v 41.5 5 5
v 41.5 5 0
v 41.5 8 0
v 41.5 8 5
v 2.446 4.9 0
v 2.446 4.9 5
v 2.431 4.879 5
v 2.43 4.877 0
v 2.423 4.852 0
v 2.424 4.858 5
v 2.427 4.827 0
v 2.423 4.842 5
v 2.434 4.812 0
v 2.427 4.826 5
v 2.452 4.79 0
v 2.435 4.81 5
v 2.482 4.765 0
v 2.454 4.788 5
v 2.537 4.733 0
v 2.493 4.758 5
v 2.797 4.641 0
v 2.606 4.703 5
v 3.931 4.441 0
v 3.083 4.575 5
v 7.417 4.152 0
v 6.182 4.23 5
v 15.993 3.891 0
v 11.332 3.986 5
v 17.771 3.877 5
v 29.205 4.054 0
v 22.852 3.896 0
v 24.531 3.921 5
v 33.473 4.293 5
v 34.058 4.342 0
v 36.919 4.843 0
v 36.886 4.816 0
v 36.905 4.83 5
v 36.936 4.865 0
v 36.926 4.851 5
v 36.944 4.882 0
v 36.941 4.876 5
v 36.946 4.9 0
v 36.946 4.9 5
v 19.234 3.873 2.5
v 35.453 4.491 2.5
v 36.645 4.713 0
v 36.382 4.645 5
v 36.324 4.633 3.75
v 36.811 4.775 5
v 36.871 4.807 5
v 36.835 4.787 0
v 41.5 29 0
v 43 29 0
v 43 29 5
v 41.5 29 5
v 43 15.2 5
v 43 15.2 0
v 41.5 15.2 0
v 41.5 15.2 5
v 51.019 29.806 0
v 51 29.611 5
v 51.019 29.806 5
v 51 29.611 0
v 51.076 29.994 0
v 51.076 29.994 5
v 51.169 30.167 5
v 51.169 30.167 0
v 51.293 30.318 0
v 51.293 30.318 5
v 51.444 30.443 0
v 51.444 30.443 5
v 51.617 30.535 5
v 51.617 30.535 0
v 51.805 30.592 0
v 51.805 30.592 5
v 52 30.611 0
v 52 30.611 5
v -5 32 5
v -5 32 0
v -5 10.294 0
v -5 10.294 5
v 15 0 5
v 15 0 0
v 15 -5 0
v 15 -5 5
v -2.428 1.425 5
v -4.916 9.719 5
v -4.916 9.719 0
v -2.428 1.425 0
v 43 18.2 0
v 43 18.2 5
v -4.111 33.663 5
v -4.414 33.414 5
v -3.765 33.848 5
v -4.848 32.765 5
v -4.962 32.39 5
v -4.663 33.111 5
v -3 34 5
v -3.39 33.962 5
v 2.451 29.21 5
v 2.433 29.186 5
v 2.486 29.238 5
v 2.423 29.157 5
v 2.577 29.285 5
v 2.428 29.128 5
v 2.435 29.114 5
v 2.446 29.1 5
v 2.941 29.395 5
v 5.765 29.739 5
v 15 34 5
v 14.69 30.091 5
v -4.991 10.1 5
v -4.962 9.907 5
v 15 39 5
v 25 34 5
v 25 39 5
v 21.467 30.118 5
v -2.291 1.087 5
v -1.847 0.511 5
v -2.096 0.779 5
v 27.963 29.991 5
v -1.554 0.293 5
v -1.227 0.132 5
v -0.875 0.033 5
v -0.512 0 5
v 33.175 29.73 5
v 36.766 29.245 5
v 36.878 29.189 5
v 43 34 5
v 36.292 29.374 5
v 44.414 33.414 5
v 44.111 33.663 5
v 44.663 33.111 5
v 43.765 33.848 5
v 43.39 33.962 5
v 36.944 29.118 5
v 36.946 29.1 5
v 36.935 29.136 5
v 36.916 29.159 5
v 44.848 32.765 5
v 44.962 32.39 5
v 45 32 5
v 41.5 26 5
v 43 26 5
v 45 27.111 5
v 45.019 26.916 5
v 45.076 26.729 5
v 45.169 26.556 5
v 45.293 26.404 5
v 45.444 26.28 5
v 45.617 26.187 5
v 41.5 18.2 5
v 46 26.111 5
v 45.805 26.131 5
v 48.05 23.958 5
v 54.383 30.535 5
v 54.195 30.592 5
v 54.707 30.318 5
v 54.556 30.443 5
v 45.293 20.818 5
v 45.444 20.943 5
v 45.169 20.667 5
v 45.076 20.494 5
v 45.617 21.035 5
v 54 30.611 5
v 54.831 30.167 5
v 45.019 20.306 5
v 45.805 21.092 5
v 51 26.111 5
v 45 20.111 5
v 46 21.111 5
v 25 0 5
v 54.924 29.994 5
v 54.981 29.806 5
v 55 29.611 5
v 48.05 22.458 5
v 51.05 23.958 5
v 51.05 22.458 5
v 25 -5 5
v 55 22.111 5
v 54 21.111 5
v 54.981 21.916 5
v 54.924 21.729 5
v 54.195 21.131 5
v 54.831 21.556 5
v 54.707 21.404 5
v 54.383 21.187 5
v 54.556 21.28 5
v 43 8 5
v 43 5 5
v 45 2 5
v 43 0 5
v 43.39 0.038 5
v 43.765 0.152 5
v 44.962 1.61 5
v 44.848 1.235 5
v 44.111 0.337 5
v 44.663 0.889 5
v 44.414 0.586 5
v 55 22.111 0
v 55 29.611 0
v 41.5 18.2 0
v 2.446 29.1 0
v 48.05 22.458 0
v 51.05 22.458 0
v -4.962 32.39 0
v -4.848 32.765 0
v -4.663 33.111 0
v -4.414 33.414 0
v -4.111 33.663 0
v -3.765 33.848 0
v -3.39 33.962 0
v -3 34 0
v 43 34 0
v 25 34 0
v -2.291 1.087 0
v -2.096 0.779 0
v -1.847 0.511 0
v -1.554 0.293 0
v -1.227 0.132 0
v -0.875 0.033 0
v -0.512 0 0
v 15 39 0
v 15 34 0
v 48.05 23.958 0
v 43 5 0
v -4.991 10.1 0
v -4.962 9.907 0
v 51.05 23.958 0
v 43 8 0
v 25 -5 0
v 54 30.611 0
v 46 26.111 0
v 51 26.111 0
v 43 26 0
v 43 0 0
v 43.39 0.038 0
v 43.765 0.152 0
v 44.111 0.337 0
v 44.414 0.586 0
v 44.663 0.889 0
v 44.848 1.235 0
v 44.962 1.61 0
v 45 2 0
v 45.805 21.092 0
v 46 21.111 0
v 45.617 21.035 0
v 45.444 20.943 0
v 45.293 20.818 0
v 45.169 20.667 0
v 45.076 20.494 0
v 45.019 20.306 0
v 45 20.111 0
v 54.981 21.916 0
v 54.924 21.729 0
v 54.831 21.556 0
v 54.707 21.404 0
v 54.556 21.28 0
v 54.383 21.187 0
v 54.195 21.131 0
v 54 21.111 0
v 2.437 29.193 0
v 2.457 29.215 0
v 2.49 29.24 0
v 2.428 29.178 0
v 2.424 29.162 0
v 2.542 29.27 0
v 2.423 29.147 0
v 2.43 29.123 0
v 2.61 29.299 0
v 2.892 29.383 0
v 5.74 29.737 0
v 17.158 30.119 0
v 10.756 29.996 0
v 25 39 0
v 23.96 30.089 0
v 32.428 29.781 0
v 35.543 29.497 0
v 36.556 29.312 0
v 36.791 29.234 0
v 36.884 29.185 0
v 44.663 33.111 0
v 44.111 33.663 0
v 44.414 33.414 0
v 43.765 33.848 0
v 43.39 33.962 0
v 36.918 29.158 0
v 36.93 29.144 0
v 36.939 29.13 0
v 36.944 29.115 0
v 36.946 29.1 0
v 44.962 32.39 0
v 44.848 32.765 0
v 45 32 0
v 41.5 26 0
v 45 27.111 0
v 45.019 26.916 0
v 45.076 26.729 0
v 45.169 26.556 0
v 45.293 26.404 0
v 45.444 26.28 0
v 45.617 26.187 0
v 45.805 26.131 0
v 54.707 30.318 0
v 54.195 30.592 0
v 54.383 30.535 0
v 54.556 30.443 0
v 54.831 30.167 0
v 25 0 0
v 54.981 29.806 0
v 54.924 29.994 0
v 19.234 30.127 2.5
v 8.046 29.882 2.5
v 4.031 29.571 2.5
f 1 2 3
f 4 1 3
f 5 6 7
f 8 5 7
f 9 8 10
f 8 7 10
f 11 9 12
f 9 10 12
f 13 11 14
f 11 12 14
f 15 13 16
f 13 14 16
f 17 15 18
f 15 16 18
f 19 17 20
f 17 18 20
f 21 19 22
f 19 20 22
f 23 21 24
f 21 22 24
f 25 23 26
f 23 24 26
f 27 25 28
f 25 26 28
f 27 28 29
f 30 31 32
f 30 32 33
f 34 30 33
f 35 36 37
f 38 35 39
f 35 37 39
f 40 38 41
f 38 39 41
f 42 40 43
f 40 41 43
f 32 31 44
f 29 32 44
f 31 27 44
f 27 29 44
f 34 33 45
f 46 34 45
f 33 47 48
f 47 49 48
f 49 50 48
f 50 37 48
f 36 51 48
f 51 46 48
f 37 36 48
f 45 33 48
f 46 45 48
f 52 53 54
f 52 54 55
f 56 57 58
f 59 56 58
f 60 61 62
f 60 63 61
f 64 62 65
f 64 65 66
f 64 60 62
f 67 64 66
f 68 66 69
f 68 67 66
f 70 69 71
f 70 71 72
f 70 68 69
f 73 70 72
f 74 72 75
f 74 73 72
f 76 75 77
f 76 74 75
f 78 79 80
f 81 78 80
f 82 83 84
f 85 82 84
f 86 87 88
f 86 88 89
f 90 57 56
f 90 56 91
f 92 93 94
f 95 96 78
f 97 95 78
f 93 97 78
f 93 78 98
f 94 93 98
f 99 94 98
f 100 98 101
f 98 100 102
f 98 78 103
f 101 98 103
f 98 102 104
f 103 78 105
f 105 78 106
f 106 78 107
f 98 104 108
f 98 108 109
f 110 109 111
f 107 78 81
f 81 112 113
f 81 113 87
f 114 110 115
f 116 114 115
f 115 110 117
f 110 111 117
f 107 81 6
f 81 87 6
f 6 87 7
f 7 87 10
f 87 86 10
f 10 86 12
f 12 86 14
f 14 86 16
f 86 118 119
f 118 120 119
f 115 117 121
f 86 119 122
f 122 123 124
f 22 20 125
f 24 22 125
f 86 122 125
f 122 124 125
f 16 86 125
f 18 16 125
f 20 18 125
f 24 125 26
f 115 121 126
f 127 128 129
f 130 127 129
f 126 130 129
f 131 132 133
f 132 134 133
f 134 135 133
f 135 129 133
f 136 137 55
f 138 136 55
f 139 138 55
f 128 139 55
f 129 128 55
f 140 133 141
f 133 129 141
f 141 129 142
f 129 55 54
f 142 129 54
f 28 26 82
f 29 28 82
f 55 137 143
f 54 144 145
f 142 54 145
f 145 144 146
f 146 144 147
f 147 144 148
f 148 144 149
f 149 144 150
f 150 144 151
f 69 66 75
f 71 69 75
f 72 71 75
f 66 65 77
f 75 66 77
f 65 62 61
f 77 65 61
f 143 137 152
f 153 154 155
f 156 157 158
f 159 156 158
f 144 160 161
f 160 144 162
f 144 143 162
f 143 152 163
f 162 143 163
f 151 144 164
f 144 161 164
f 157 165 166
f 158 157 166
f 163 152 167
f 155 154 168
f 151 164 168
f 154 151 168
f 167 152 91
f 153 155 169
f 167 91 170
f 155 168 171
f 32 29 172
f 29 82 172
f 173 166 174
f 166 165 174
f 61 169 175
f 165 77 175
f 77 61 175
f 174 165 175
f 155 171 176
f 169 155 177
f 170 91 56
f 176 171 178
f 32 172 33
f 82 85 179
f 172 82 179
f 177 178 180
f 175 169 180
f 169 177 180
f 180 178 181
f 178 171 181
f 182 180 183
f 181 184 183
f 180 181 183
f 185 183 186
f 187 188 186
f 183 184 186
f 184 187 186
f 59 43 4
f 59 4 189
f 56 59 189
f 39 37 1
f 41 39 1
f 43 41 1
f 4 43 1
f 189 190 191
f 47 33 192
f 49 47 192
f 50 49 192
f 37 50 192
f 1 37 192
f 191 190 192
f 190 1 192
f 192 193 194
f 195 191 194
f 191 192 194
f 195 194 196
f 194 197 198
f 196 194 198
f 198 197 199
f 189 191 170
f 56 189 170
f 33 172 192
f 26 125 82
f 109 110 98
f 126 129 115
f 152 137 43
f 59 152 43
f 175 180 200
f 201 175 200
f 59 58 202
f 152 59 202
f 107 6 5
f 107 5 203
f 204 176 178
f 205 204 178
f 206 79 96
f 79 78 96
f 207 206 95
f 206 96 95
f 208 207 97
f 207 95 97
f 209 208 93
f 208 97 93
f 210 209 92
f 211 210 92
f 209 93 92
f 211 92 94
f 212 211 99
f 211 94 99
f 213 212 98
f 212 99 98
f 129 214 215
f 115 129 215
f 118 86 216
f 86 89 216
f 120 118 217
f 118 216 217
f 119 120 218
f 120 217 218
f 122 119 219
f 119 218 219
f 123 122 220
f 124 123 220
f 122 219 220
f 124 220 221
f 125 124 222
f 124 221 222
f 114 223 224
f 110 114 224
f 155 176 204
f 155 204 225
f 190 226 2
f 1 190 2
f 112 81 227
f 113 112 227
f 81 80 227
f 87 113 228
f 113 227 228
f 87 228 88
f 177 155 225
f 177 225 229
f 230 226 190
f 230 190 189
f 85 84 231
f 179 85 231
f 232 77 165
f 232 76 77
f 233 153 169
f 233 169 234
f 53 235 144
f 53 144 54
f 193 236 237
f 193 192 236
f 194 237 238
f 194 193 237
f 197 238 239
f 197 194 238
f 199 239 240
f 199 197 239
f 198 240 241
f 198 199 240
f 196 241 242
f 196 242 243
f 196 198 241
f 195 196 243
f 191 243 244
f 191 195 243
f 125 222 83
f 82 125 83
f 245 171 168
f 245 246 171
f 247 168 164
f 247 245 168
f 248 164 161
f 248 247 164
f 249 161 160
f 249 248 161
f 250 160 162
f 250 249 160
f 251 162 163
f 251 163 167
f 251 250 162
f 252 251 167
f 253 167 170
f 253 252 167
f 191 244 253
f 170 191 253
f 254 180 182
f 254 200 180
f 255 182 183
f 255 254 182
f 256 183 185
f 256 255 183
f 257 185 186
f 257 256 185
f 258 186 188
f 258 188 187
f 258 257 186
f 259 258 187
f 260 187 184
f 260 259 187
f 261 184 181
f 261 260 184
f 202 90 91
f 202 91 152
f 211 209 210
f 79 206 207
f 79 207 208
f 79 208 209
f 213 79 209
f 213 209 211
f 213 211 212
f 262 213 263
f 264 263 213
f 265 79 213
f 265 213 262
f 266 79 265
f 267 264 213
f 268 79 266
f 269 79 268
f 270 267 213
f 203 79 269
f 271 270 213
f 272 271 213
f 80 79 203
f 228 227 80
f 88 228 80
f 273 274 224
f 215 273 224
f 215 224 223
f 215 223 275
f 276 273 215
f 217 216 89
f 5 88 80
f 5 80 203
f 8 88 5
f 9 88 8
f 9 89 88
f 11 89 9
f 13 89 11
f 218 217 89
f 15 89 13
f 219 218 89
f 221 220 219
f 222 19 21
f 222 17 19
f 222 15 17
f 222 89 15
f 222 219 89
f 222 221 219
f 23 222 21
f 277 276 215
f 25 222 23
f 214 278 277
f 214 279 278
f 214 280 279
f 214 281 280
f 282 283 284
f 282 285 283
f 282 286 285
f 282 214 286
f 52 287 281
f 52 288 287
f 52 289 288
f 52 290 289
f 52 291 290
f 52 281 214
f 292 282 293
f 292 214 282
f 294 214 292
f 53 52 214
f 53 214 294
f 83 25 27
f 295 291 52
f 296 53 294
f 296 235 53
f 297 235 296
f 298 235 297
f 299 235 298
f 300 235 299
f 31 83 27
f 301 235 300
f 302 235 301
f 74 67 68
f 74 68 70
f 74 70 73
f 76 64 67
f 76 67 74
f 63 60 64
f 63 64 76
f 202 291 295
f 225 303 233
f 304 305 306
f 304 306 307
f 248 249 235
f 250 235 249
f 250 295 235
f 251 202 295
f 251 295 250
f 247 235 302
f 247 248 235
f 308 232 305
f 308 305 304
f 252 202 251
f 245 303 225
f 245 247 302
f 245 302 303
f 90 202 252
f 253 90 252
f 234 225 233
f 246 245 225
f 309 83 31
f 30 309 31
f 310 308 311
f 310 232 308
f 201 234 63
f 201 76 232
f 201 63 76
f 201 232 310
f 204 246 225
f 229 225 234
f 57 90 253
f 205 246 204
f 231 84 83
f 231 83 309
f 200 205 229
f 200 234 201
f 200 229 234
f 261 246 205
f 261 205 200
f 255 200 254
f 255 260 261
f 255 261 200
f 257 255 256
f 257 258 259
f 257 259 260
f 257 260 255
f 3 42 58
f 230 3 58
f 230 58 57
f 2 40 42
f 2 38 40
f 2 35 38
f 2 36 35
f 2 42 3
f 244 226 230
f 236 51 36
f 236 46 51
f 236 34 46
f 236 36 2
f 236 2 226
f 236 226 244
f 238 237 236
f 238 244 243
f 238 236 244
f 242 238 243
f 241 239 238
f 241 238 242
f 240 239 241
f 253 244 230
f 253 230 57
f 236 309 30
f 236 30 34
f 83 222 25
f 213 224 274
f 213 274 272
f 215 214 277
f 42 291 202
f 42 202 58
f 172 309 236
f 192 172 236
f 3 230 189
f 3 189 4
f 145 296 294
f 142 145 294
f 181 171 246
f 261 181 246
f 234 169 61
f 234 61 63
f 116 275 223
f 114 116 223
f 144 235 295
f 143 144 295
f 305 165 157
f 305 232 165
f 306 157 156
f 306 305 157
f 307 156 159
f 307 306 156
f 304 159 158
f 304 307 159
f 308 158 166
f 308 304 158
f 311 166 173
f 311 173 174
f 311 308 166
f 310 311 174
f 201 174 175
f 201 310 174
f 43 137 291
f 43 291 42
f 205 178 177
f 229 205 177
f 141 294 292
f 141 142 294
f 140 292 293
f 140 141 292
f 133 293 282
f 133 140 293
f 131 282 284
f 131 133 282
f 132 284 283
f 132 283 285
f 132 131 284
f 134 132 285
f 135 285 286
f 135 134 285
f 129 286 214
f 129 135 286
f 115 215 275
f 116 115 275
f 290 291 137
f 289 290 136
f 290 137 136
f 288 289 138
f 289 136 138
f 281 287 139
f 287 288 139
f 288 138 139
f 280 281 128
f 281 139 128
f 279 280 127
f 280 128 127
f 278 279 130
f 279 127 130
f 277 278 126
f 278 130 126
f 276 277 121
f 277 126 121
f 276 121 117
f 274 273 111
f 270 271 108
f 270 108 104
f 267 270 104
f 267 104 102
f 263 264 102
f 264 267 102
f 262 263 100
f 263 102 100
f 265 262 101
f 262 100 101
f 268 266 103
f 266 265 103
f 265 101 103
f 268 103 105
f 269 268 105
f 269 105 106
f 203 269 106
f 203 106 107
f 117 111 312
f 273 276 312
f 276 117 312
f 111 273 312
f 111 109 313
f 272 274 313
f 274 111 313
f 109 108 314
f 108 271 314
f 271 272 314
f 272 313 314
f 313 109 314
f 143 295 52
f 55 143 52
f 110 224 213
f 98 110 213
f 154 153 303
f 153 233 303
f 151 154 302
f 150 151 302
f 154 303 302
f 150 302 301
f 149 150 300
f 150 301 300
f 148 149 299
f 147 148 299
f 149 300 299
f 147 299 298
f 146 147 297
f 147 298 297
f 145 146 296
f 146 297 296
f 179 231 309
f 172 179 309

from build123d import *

# Parameters (mm, degrees)
RESSALTO_EXTRUS_O1_DEPTH = 5
CORTE_EXTRUS_O1_DEPTH    = 6
FILETE1_R                = 2
CORTE_EXTRUS_O2_DEPTH    = 6.0000001
FILETE2_R                = 2
ESBO_O4_W                = 1.5
ESBO_O4_H                = 3
CORTE_EXTRUS_O3_DEPTH    = 6.0000001
ESBO_O5_W                = 5
ESBO_O5_H                = 5
RESSALTO_EXTRUS_O2_DEPTH = 10
ESBO_O6_W                = 4
ESBO_O6_H                = 5
RESSALTO_EXTRUS_O3_DEPTH = 4.5
ESBO_O7_W                = 3
ESBO_O7_H                = 1.5
CORTE_EXTRUS_O4_DEPTH    = 6.0000001
FILETE3_R                = 1


with BuildPart() as part:
    # Esboço1 → Ressalto-extrusão1 (new body)
    with BuildSketch(Plane.XY):
        Polygon((-5, 0), (15, 0), (15, -5), (25, -5), (25, 0), (45, 0), (45, 34), (25, 34), (25, 39), (15, 39), (15, 34), (-5, 34), align=None)
    extrude(amount=RESSALTO_EXTRUS_O1_DEPTH)

    # Esboço2 → Corte-extrusão1 (cut, through all)
    with BuildSketch(Plane.XY.offset(5)):
        with BuildLine():
            Line((2.44644355, 4.9), (2.44644355, 29.1))
            add(Edge.make_bspline(
                [(36.94644355, 29.1), (36.948002105, 30.126549864), (19.233916272, 30.126549864), (1.51983044, 30.126549864), (2.44644355, 29.1)],
                knots=[0, 0, 0, 1.596998014, 1.596998014, 3.193996028, 3.193996028, 3.193996028], degree=2, weights=[1, 0.697782671, 1, 0.697782671, 1]))
            Line((36.94644355, 29.1), (36.94644355, 4.9))
            add(Edge.make_bspline(
                [(2.44644355, 4.9), (1.51983044, 3.873450136), (19.233916272, 3.873450136), (36.948002105, 3.873450136), (36.94644355, 4.9)],
                knots=[3.089189279, 3.089189279, 3.089189279, 4.686187293, 4.686187293, 6.283185307, 6.283185307, 6.283185307], degree=2, weights=[1, 0.697782671, 1, 0.697782671, 1]))
        make_face()
    extrude(amount=-CORTE_EXTRUS_O1_DEPTH, mode=Mode.SUBTRACT)

    # Filete1
    filete1_edges = [part.edges().sort_by_distance(p)[0] for p in [
        (-5, 34, 2.5),
        (45, 34, 2.5),
        (45, 0, 2.5),
    ]]
    fillet(filete1_edges, radius=FILETE1_R)

    # Esboço3 → Corte-extrusão2 (cut, through all)
    with BuildSketch(Plane.XY.offset(5)):
        Polygon((-5, 10), (-2, 0), (-5, 0), align=None)
    extrude(amount=-CORTE_EXTRUS_O2_DEPTH, mode=Mode.SUBTRACT)

    # Filete2
    filete2_edges = [part.edges().sort_by_distance(p)[0] for p in [
        (-5, 10, 2.5),
        (-2, 0, 2.5),
    ]]
    fillet(filete2_edges, radius=FILETE2_R)

    # Esboço4 → Corte-extrusão3 (cut, through all)
    with BuildSketch(Plane(origin=(0, 0, 0), x_dir=(-1, 0, 0), z_dir=(0, 0, -1))):
        with Locations((-42.25, 27.5)):
            Rectangle(ESBO_O4_W, ESBO_O4_H)
        with Locations((-42.25, 16.699542108)):
            Rectangle(ESBO_O4_W, ESBO_O4_H)
        with Locations((-42.25, 6.5)):
            Rectangle(ESBO_O4_W, ESBO_O4_H)
    extrude(amount=-CORTE_EXTRUS_O3_DEPTH, mode=Mode.SUBTRACT)

    # Esboço5 → Ressalto-extrusão2 (add)
    with BuildSketch(Plane(origin=(45, 0, 0), x_dir=(0, 0, -1), z_dir=(1, 0, 0))):
        with Locations((-2.5, 23.61133512)):
            Rectangle(ESBO_O5_W, ESBO_O5_H)
    extrude(amount=RESSALTO_EXTRUS_O2_DEPTH)

    # Esboço6 → Ressalto-extrusão3 (add)
    with BuildSketch(Plane(origin=(0, 26.11133512, 0), x_dir=(1, 0, 0), z_dir=(0, 1, 0))):
        with Locations((53, -2.5)):
            Rectangle(ESBO_O6_W, ESBO_O6_H)
    extrude(amount=RESSALTO_EXTRUS_O3_DEPTH)

    # Esboço7 → Corte-extrusão4 (cut, through all)
    with BuildSketch(Plane.XY.offset(5)):
        with Locations((49.550379902, 23.207612691)):
            Rectangle(ESBO_O7_W, ESBO_O7_H)
    extrude(amount=-CORTE_EXTRUS_O4_DEPTH, mode=Mode.SUBTRACT)

    # Filete3
    filete3_edges = [part.edges().sort_by_distance(p)[0] for p in [
        (45, 21.11133512, 2.5),
        (45, 26.11133512, 2.5),
        (55, 21.11133512, 2.5),
        (55, 30.61133512, 2.5),
        (51, 30.61133512, 2.5),
    ]]
    fillet(filete3_edges, radius=FILETE3_R)


solid = part.part
